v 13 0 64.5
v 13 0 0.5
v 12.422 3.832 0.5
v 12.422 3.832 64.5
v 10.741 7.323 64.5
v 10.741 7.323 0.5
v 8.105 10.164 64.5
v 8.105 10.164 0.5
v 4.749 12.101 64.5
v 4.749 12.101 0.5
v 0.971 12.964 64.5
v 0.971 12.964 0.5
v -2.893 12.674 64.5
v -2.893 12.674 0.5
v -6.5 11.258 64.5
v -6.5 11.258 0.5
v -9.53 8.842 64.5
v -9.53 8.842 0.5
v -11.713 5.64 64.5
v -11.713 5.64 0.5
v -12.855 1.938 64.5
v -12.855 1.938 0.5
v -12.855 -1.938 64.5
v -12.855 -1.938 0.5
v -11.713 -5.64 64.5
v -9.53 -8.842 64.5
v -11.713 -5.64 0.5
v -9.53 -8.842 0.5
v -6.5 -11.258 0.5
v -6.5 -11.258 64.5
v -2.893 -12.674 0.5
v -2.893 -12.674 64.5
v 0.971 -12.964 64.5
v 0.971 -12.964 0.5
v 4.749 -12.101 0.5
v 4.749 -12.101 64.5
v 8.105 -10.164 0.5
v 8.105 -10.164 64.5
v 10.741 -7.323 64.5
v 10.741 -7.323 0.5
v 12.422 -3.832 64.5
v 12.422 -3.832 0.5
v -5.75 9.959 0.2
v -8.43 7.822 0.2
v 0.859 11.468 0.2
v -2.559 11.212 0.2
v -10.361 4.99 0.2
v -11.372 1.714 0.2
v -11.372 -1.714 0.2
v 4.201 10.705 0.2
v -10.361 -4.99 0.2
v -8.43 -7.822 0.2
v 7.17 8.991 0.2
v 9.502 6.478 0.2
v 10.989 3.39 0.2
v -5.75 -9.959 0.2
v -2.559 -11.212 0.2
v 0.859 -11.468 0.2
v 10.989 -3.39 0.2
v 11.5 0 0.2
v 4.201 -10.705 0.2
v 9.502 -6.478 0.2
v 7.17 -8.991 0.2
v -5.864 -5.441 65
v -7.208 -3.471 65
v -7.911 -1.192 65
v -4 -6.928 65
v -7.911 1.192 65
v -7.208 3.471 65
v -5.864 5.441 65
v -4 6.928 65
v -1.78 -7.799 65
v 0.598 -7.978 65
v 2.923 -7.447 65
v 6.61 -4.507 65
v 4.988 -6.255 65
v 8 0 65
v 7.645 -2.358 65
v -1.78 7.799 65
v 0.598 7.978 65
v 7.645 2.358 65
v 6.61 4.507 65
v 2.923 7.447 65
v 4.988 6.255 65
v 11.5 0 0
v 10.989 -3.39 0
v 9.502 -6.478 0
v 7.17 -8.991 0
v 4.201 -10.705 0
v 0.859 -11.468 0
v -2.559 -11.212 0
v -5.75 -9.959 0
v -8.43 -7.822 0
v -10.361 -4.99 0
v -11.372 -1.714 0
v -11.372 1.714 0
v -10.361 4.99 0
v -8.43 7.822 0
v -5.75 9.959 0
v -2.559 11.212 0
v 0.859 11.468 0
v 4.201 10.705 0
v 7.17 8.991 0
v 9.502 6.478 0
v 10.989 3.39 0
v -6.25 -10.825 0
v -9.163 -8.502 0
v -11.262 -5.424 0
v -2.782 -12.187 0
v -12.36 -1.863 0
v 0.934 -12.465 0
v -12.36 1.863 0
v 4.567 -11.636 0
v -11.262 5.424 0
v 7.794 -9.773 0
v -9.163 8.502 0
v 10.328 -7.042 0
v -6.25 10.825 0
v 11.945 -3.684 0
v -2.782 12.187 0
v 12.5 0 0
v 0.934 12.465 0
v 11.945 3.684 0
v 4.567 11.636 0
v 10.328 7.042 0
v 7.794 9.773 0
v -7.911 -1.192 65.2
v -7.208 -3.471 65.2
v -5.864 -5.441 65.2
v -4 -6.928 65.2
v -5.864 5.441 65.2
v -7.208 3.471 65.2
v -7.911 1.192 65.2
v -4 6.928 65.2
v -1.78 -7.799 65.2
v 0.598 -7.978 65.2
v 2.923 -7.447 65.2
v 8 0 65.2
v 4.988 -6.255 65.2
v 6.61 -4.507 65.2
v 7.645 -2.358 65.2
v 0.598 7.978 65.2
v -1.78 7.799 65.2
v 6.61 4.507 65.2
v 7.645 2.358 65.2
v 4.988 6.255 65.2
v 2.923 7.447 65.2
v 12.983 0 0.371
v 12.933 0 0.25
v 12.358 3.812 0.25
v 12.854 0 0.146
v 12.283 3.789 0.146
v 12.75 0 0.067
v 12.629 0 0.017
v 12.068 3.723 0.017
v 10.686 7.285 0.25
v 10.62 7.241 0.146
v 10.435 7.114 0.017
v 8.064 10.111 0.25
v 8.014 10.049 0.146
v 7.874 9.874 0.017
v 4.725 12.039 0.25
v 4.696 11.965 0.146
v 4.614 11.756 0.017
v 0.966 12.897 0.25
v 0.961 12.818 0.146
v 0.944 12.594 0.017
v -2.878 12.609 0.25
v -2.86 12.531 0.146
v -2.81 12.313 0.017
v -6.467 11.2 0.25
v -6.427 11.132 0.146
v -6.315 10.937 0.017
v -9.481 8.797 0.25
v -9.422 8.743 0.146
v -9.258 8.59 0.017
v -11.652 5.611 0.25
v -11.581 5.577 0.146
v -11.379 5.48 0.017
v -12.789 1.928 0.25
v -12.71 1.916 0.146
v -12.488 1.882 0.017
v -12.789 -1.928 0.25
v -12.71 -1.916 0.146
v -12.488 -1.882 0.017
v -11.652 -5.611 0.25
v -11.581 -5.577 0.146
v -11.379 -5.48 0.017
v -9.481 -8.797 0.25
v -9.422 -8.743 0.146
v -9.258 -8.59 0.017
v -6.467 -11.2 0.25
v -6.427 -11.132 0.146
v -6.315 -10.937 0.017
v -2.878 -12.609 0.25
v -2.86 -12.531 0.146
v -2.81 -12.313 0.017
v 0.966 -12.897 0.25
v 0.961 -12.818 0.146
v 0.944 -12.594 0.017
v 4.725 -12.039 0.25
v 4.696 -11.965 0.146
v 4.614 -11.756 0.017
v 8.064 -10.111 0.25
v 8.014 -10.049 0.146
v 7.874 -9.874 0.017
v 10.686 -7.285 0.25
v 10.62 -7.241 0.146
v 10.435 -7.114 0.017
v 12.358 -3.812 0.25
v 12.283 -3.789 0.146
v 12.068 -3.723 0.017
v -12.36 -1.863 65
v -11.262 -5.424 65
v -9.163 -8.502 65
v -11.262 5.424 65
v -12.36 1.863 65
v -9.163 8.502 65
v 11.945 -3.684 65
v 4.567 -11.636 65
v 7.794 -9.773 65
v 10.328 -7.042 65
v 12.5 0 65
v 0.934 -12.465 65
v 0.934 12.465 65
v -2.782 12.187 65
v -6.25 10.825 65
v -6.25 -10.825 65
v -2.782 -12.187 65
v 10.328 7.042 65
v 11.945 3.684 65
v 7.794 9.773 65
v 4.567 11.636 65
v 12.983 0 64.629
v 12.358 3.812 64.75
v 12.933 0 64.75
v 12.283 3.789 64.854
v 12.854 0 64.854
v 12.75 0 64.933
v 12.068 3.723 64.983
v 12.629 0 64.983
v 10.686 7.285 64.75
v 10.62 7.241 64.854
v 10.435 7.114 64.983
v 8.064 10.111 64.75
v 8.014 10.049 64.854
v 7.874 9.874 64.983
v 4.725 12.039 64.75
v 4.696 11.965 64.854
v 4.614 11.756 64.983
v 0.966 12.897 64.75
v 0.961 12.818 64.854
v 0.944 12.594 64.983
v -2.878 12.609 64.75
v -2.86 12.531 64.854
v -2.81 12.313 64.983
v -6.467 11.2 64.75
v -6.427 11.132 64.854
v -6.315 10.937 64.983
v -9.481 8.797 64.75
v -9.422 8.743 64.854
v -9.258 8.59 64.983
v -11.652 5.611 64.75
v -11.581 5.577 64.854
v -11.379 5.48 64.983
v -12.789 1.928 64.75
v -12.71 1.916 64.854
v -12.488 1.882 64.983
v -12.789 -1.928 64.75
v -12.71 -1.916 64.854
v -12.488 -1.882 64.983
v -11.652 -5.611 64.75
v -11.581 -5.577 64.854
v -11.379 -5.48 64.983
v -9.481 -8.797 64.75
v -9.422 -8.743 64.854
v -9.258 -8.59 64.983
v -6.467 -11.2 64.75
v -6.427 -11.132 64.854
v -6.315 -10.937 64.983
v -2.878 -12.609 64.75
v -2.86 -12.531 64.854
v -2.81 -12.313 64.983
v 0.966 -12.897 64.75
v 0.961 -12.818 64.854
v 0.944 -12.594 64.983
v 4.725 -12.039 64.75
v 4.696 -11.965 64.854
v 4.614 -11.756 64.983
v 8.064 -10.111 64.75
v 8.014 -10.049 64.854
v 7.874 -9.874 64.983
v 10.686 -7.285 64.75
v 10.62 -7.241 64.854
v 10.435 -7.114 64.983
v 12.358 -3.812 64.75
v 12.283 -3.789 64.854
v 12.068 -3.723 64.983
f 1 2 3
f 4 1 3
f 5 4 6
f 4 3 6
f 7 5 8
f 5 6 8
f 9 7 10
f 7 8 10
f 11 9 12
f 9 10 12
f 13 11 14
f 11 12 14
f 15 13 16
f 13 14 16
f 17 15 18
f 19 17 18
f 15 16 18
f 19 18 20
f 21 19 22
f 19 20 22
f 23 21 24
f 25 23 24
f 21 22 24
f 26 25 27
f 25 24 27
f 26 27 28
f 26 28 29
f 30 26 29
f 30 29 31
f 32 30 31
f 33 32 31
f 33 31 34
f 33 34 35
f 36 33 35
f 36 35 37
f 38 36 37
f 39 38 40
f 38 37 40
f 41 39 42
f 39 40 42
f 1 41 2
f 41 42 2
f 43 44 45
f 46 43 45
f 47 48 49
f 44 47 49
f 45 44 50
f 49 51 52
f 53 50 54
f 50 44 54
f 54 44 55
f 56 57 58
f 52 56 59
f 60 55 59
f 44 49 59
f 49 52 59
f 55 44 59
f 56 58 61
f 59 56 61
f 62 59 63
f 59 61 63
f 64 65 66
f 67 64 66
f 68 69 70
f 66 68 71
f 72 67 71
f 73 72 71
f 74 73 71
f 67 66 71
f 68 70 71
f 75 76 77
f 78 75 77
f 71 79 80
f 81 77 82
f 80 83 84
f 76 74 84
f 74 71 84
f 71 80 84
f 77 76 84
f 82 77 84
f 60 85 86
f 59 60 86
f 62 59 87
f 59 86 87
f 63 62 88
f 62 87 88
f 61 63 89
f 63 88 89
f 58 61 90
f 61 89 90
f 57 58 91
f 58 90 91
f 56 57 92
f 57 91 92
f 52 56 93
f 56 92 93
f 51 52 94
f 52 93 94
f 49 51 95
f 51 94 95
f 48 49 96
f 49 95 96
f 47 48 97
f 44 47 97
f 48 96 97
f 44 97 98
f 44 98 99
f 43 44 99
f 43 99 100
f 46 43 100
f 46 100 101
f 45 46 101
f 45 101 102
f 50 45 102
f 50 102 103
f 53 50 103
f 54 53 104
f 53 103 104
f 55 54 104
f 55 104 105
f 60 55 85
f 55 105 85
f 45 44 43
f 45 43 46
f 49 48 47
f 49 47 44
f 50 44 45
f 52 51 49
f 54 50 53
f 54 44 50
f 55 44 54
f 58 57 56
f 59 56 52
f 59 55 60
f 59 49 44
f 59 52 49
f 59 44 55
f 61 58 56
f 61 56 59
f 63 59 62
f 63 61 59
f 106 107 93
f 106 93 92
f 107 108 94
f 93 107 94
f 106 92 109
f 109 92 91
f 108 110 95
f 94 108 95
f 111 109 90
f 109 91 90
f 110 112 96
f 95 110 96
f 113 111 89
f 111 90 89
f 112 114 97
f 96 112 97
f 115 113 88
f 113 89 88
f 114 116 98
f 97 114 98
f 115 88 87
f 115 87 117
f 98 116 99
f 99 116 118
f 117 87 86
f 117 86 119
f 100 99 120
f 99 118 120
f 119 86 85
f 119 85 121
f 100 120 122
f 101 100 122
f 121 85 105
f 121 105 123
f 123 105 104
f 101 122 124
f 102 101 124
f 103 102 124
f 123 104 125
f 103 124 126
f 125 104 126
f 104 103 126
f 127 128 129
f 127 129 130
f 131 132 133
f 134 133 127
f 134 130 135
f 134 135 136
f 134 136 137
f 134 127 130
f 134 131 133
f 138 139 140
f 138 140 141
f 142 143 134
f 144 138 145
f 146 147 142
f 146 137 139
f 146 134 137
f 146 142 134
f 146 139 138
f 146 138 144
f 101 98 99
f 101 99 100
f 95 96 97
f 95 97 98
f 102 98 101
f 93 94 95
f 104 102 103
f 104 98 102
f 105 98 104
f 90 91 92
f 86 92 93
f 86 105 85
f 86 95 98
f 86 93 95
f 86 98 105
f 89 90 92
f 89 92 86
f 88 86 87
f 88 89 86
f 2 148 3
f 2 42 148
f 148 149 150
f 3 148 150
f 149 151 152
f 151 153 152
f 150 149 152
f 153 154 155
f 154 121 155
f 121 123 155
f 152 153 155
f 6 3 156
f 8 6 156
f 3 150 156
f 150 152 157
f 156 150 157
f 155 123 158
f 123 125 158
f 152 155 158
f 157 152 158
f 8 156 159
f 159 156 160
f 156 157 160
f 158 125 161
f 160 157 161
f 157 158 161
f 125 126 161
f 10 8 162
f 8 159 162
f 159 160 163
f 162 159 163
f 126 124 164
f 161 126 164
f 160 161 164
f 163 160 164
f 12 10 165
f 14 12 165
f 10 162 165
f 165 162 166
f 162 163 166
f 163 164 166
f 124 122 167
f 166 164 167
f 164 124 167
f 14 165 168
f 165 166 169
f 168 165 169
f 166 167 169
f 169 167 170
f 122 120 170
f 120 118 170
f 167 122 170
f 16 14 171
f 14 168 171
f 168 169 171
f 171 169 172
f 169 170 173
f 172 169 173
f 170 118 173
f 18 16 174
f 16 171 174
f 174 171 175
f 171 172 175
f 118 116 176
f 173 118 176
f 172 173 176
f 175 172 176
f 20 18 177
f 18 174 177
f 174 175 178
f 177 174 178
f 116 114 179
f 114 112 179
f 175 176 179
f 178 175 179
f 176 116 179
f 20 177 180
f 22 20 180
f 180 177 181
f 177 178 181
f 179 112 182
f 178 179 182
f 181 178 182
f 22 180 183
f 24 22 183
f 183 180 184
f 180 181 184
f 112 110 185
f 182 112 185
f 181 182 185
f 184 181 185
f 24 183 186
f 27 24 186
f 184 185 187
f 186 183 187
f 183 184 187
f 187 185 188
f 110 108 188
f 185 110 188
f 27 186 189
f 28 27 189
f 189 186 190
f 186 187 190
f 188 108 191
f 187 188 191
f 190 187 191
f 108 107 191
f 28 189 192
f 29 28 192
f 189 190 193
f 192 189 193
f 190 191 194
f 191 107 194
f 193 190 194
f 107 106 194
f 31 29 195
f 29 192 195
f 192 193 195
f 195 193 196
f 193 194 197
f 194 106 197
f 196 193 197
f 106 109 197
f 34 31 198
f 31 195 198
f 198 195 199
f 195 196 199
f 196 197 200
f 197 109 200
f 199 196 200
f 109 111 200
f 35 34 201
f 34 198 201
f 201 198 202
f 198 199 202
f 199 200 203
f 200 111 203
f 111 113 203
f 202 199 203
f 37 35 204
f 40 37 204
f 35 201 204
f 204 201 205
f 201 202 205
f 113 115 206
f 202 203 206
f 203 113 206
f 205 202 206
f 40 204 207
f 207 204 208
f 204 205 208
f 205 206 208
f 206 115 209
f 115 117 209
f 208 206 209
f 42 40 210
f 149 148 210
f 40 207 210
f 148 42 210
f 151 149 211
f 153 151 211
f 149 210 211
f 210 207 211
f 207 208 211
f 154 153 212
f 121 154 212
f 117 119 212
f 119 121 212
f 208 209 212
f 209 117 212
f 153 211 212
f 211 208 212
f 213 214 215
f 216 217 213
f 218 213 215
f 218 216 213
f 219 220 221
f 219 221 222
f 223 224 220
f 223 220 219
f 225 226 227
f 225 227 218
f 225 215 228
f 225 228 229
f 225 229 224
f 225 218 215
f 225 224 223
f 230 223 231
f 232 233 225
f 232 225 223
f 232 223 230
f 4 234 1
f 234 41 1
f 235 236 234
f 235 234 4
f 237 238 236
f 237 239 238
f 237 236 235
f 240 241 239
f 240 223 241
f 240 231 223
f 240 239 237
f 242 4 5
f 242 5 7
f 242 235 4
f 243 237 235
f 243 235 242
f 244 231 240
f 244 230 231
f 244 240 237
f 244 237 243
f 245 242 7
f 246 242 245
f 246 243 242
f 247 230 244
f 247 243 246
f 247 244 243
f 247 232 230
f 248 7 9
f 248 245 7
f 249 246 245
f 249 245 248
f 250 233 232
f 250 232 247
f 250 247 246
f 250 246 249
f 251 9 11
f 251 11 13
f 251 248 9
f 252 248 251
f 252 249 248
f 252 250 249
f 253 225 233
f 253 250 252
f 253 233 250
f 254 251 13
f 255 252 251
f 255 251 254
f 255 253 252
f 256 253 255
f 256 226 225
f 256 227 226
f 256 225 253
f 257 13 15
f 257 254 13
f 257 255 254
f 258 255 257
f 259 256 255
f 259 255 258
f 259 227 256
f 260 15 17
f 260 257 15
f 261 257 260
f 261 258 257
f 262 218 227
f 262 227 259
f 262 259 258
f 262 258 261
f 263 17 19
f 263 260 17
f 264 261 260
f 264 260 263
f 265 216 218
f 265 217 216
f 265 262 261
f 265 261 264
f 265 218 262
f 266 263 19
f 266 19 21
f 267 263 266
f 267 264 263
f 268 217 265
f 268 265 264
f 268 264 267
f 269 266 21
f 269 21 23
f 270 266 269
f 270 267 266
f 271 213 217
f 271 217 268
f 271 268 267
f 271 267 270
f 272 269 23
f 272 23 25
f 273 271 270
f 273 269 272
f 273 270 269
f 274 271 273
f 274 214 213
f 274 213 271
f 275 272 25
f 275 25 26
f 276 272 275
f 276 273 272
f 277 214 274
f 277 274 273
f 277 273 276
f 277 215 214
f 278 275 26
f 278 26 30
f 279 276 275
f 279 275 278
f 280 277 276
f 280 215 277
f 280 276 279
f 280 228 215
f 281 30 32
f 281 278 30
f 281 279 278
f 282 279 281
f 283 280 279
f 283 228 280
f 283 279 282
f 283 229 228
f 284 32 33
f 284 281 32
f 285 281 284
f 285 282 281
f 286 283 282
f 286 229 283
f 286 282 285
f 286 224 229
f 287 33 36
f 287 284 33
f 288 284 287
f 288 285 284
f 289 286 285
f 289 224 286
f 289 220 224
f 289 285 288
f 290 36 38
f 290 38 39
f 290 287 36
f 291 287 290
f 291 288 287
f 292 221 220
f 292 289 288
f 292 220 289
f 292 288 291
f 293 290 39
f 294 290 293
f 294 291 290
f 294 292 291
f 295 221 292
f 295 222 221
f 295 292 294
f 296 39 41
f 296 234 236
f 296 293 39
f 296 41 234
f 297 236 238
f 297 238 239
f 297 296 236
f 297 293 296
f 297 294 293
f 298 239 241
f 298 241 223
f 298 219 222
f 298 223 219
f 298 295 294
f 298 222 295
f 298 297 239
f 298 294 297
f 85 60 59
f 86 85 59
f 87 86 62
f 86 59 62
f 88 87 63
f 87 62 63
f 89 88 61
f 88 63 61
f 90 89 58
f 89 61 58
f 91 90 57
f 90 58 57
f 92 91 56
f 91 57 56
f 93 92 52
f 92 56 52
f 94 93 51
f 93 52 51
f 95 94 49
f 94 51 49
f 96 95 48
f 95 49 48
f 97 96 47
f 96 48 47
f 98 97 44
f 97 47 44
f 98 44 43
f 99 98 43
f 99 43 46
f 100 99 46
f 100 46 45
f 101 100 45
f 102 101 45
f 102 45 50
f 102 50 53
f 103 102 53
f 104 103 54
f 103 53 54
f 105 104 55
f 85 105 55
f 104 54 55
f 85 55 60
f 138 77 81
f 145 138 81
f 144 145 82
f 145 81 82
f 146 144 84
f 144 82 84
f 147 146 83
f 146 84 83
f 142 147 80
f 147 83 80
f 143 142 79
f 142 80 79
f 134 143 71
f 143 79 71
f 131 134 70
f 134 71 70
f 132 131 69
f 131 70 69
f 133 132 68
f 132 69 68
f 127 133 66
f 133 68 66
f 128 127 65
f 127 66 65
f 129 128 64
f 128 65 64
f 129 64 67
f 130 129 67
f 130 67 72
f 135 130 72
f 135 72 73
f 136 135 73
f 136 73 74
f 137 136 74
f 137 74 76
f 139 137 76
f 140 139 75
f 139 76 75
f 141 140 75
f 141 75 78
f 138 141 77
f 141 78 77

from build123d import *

# Parameters (mm, degrees)
F0_R     = 13
F1_DEPTH = 65
F2_R     = 8
F3_DEPTH = 0.2
F4_R     = 11.5
F5_DEPTH = 0.2
F6_R     = 11.5
F7_DEPTH = 0.2
F8_R     = 0.5


with BuildPart() as f1:
    # F0 (on Top) → F1 (new body)
    with BuildSketch(Plane.XY):
        Circle(F0_R)
    extrude(amount=F1_DEPTH)

    # F4 (on face) → F5 (cut)
    with BuildSketch(Plane(origin=(0, 0, 0), x_dir=(1, 0, 0), z_dir=(0, 0, -1))):
        Circle(F4_R)
    extrude(amount=-F5_DEPTH, mode=Mode.SUBTRACT)

    # F8
    f8_edges = [f1.edges().sort_by_distance(p)[0] for p in [
        (-13, 0, 65),
        (-13, 0, 0),
    ]]
    fillet(f8_edges, radius=F8_R)


with BuildPart() as f3:
    # F2 (on face) → F3 (new body)
    with BuildSketch(Plane.XY.offset(65)):
        Circle(F2_R)
    extrude(amount=F3_DEPTH)


with BuildPart() as f7:
    # F6 (on face) → F7 (new body)
    with BuildSketch(Plane(origin=(0, 0, 0.2), x_dir=(1, 0, 0), z_dir=(0, 0, -1))):
        Circle(F6_R)
    extrude(amount=F7_DEPTH)


solid = Compound([f1.part, f3.part, f7.part])
